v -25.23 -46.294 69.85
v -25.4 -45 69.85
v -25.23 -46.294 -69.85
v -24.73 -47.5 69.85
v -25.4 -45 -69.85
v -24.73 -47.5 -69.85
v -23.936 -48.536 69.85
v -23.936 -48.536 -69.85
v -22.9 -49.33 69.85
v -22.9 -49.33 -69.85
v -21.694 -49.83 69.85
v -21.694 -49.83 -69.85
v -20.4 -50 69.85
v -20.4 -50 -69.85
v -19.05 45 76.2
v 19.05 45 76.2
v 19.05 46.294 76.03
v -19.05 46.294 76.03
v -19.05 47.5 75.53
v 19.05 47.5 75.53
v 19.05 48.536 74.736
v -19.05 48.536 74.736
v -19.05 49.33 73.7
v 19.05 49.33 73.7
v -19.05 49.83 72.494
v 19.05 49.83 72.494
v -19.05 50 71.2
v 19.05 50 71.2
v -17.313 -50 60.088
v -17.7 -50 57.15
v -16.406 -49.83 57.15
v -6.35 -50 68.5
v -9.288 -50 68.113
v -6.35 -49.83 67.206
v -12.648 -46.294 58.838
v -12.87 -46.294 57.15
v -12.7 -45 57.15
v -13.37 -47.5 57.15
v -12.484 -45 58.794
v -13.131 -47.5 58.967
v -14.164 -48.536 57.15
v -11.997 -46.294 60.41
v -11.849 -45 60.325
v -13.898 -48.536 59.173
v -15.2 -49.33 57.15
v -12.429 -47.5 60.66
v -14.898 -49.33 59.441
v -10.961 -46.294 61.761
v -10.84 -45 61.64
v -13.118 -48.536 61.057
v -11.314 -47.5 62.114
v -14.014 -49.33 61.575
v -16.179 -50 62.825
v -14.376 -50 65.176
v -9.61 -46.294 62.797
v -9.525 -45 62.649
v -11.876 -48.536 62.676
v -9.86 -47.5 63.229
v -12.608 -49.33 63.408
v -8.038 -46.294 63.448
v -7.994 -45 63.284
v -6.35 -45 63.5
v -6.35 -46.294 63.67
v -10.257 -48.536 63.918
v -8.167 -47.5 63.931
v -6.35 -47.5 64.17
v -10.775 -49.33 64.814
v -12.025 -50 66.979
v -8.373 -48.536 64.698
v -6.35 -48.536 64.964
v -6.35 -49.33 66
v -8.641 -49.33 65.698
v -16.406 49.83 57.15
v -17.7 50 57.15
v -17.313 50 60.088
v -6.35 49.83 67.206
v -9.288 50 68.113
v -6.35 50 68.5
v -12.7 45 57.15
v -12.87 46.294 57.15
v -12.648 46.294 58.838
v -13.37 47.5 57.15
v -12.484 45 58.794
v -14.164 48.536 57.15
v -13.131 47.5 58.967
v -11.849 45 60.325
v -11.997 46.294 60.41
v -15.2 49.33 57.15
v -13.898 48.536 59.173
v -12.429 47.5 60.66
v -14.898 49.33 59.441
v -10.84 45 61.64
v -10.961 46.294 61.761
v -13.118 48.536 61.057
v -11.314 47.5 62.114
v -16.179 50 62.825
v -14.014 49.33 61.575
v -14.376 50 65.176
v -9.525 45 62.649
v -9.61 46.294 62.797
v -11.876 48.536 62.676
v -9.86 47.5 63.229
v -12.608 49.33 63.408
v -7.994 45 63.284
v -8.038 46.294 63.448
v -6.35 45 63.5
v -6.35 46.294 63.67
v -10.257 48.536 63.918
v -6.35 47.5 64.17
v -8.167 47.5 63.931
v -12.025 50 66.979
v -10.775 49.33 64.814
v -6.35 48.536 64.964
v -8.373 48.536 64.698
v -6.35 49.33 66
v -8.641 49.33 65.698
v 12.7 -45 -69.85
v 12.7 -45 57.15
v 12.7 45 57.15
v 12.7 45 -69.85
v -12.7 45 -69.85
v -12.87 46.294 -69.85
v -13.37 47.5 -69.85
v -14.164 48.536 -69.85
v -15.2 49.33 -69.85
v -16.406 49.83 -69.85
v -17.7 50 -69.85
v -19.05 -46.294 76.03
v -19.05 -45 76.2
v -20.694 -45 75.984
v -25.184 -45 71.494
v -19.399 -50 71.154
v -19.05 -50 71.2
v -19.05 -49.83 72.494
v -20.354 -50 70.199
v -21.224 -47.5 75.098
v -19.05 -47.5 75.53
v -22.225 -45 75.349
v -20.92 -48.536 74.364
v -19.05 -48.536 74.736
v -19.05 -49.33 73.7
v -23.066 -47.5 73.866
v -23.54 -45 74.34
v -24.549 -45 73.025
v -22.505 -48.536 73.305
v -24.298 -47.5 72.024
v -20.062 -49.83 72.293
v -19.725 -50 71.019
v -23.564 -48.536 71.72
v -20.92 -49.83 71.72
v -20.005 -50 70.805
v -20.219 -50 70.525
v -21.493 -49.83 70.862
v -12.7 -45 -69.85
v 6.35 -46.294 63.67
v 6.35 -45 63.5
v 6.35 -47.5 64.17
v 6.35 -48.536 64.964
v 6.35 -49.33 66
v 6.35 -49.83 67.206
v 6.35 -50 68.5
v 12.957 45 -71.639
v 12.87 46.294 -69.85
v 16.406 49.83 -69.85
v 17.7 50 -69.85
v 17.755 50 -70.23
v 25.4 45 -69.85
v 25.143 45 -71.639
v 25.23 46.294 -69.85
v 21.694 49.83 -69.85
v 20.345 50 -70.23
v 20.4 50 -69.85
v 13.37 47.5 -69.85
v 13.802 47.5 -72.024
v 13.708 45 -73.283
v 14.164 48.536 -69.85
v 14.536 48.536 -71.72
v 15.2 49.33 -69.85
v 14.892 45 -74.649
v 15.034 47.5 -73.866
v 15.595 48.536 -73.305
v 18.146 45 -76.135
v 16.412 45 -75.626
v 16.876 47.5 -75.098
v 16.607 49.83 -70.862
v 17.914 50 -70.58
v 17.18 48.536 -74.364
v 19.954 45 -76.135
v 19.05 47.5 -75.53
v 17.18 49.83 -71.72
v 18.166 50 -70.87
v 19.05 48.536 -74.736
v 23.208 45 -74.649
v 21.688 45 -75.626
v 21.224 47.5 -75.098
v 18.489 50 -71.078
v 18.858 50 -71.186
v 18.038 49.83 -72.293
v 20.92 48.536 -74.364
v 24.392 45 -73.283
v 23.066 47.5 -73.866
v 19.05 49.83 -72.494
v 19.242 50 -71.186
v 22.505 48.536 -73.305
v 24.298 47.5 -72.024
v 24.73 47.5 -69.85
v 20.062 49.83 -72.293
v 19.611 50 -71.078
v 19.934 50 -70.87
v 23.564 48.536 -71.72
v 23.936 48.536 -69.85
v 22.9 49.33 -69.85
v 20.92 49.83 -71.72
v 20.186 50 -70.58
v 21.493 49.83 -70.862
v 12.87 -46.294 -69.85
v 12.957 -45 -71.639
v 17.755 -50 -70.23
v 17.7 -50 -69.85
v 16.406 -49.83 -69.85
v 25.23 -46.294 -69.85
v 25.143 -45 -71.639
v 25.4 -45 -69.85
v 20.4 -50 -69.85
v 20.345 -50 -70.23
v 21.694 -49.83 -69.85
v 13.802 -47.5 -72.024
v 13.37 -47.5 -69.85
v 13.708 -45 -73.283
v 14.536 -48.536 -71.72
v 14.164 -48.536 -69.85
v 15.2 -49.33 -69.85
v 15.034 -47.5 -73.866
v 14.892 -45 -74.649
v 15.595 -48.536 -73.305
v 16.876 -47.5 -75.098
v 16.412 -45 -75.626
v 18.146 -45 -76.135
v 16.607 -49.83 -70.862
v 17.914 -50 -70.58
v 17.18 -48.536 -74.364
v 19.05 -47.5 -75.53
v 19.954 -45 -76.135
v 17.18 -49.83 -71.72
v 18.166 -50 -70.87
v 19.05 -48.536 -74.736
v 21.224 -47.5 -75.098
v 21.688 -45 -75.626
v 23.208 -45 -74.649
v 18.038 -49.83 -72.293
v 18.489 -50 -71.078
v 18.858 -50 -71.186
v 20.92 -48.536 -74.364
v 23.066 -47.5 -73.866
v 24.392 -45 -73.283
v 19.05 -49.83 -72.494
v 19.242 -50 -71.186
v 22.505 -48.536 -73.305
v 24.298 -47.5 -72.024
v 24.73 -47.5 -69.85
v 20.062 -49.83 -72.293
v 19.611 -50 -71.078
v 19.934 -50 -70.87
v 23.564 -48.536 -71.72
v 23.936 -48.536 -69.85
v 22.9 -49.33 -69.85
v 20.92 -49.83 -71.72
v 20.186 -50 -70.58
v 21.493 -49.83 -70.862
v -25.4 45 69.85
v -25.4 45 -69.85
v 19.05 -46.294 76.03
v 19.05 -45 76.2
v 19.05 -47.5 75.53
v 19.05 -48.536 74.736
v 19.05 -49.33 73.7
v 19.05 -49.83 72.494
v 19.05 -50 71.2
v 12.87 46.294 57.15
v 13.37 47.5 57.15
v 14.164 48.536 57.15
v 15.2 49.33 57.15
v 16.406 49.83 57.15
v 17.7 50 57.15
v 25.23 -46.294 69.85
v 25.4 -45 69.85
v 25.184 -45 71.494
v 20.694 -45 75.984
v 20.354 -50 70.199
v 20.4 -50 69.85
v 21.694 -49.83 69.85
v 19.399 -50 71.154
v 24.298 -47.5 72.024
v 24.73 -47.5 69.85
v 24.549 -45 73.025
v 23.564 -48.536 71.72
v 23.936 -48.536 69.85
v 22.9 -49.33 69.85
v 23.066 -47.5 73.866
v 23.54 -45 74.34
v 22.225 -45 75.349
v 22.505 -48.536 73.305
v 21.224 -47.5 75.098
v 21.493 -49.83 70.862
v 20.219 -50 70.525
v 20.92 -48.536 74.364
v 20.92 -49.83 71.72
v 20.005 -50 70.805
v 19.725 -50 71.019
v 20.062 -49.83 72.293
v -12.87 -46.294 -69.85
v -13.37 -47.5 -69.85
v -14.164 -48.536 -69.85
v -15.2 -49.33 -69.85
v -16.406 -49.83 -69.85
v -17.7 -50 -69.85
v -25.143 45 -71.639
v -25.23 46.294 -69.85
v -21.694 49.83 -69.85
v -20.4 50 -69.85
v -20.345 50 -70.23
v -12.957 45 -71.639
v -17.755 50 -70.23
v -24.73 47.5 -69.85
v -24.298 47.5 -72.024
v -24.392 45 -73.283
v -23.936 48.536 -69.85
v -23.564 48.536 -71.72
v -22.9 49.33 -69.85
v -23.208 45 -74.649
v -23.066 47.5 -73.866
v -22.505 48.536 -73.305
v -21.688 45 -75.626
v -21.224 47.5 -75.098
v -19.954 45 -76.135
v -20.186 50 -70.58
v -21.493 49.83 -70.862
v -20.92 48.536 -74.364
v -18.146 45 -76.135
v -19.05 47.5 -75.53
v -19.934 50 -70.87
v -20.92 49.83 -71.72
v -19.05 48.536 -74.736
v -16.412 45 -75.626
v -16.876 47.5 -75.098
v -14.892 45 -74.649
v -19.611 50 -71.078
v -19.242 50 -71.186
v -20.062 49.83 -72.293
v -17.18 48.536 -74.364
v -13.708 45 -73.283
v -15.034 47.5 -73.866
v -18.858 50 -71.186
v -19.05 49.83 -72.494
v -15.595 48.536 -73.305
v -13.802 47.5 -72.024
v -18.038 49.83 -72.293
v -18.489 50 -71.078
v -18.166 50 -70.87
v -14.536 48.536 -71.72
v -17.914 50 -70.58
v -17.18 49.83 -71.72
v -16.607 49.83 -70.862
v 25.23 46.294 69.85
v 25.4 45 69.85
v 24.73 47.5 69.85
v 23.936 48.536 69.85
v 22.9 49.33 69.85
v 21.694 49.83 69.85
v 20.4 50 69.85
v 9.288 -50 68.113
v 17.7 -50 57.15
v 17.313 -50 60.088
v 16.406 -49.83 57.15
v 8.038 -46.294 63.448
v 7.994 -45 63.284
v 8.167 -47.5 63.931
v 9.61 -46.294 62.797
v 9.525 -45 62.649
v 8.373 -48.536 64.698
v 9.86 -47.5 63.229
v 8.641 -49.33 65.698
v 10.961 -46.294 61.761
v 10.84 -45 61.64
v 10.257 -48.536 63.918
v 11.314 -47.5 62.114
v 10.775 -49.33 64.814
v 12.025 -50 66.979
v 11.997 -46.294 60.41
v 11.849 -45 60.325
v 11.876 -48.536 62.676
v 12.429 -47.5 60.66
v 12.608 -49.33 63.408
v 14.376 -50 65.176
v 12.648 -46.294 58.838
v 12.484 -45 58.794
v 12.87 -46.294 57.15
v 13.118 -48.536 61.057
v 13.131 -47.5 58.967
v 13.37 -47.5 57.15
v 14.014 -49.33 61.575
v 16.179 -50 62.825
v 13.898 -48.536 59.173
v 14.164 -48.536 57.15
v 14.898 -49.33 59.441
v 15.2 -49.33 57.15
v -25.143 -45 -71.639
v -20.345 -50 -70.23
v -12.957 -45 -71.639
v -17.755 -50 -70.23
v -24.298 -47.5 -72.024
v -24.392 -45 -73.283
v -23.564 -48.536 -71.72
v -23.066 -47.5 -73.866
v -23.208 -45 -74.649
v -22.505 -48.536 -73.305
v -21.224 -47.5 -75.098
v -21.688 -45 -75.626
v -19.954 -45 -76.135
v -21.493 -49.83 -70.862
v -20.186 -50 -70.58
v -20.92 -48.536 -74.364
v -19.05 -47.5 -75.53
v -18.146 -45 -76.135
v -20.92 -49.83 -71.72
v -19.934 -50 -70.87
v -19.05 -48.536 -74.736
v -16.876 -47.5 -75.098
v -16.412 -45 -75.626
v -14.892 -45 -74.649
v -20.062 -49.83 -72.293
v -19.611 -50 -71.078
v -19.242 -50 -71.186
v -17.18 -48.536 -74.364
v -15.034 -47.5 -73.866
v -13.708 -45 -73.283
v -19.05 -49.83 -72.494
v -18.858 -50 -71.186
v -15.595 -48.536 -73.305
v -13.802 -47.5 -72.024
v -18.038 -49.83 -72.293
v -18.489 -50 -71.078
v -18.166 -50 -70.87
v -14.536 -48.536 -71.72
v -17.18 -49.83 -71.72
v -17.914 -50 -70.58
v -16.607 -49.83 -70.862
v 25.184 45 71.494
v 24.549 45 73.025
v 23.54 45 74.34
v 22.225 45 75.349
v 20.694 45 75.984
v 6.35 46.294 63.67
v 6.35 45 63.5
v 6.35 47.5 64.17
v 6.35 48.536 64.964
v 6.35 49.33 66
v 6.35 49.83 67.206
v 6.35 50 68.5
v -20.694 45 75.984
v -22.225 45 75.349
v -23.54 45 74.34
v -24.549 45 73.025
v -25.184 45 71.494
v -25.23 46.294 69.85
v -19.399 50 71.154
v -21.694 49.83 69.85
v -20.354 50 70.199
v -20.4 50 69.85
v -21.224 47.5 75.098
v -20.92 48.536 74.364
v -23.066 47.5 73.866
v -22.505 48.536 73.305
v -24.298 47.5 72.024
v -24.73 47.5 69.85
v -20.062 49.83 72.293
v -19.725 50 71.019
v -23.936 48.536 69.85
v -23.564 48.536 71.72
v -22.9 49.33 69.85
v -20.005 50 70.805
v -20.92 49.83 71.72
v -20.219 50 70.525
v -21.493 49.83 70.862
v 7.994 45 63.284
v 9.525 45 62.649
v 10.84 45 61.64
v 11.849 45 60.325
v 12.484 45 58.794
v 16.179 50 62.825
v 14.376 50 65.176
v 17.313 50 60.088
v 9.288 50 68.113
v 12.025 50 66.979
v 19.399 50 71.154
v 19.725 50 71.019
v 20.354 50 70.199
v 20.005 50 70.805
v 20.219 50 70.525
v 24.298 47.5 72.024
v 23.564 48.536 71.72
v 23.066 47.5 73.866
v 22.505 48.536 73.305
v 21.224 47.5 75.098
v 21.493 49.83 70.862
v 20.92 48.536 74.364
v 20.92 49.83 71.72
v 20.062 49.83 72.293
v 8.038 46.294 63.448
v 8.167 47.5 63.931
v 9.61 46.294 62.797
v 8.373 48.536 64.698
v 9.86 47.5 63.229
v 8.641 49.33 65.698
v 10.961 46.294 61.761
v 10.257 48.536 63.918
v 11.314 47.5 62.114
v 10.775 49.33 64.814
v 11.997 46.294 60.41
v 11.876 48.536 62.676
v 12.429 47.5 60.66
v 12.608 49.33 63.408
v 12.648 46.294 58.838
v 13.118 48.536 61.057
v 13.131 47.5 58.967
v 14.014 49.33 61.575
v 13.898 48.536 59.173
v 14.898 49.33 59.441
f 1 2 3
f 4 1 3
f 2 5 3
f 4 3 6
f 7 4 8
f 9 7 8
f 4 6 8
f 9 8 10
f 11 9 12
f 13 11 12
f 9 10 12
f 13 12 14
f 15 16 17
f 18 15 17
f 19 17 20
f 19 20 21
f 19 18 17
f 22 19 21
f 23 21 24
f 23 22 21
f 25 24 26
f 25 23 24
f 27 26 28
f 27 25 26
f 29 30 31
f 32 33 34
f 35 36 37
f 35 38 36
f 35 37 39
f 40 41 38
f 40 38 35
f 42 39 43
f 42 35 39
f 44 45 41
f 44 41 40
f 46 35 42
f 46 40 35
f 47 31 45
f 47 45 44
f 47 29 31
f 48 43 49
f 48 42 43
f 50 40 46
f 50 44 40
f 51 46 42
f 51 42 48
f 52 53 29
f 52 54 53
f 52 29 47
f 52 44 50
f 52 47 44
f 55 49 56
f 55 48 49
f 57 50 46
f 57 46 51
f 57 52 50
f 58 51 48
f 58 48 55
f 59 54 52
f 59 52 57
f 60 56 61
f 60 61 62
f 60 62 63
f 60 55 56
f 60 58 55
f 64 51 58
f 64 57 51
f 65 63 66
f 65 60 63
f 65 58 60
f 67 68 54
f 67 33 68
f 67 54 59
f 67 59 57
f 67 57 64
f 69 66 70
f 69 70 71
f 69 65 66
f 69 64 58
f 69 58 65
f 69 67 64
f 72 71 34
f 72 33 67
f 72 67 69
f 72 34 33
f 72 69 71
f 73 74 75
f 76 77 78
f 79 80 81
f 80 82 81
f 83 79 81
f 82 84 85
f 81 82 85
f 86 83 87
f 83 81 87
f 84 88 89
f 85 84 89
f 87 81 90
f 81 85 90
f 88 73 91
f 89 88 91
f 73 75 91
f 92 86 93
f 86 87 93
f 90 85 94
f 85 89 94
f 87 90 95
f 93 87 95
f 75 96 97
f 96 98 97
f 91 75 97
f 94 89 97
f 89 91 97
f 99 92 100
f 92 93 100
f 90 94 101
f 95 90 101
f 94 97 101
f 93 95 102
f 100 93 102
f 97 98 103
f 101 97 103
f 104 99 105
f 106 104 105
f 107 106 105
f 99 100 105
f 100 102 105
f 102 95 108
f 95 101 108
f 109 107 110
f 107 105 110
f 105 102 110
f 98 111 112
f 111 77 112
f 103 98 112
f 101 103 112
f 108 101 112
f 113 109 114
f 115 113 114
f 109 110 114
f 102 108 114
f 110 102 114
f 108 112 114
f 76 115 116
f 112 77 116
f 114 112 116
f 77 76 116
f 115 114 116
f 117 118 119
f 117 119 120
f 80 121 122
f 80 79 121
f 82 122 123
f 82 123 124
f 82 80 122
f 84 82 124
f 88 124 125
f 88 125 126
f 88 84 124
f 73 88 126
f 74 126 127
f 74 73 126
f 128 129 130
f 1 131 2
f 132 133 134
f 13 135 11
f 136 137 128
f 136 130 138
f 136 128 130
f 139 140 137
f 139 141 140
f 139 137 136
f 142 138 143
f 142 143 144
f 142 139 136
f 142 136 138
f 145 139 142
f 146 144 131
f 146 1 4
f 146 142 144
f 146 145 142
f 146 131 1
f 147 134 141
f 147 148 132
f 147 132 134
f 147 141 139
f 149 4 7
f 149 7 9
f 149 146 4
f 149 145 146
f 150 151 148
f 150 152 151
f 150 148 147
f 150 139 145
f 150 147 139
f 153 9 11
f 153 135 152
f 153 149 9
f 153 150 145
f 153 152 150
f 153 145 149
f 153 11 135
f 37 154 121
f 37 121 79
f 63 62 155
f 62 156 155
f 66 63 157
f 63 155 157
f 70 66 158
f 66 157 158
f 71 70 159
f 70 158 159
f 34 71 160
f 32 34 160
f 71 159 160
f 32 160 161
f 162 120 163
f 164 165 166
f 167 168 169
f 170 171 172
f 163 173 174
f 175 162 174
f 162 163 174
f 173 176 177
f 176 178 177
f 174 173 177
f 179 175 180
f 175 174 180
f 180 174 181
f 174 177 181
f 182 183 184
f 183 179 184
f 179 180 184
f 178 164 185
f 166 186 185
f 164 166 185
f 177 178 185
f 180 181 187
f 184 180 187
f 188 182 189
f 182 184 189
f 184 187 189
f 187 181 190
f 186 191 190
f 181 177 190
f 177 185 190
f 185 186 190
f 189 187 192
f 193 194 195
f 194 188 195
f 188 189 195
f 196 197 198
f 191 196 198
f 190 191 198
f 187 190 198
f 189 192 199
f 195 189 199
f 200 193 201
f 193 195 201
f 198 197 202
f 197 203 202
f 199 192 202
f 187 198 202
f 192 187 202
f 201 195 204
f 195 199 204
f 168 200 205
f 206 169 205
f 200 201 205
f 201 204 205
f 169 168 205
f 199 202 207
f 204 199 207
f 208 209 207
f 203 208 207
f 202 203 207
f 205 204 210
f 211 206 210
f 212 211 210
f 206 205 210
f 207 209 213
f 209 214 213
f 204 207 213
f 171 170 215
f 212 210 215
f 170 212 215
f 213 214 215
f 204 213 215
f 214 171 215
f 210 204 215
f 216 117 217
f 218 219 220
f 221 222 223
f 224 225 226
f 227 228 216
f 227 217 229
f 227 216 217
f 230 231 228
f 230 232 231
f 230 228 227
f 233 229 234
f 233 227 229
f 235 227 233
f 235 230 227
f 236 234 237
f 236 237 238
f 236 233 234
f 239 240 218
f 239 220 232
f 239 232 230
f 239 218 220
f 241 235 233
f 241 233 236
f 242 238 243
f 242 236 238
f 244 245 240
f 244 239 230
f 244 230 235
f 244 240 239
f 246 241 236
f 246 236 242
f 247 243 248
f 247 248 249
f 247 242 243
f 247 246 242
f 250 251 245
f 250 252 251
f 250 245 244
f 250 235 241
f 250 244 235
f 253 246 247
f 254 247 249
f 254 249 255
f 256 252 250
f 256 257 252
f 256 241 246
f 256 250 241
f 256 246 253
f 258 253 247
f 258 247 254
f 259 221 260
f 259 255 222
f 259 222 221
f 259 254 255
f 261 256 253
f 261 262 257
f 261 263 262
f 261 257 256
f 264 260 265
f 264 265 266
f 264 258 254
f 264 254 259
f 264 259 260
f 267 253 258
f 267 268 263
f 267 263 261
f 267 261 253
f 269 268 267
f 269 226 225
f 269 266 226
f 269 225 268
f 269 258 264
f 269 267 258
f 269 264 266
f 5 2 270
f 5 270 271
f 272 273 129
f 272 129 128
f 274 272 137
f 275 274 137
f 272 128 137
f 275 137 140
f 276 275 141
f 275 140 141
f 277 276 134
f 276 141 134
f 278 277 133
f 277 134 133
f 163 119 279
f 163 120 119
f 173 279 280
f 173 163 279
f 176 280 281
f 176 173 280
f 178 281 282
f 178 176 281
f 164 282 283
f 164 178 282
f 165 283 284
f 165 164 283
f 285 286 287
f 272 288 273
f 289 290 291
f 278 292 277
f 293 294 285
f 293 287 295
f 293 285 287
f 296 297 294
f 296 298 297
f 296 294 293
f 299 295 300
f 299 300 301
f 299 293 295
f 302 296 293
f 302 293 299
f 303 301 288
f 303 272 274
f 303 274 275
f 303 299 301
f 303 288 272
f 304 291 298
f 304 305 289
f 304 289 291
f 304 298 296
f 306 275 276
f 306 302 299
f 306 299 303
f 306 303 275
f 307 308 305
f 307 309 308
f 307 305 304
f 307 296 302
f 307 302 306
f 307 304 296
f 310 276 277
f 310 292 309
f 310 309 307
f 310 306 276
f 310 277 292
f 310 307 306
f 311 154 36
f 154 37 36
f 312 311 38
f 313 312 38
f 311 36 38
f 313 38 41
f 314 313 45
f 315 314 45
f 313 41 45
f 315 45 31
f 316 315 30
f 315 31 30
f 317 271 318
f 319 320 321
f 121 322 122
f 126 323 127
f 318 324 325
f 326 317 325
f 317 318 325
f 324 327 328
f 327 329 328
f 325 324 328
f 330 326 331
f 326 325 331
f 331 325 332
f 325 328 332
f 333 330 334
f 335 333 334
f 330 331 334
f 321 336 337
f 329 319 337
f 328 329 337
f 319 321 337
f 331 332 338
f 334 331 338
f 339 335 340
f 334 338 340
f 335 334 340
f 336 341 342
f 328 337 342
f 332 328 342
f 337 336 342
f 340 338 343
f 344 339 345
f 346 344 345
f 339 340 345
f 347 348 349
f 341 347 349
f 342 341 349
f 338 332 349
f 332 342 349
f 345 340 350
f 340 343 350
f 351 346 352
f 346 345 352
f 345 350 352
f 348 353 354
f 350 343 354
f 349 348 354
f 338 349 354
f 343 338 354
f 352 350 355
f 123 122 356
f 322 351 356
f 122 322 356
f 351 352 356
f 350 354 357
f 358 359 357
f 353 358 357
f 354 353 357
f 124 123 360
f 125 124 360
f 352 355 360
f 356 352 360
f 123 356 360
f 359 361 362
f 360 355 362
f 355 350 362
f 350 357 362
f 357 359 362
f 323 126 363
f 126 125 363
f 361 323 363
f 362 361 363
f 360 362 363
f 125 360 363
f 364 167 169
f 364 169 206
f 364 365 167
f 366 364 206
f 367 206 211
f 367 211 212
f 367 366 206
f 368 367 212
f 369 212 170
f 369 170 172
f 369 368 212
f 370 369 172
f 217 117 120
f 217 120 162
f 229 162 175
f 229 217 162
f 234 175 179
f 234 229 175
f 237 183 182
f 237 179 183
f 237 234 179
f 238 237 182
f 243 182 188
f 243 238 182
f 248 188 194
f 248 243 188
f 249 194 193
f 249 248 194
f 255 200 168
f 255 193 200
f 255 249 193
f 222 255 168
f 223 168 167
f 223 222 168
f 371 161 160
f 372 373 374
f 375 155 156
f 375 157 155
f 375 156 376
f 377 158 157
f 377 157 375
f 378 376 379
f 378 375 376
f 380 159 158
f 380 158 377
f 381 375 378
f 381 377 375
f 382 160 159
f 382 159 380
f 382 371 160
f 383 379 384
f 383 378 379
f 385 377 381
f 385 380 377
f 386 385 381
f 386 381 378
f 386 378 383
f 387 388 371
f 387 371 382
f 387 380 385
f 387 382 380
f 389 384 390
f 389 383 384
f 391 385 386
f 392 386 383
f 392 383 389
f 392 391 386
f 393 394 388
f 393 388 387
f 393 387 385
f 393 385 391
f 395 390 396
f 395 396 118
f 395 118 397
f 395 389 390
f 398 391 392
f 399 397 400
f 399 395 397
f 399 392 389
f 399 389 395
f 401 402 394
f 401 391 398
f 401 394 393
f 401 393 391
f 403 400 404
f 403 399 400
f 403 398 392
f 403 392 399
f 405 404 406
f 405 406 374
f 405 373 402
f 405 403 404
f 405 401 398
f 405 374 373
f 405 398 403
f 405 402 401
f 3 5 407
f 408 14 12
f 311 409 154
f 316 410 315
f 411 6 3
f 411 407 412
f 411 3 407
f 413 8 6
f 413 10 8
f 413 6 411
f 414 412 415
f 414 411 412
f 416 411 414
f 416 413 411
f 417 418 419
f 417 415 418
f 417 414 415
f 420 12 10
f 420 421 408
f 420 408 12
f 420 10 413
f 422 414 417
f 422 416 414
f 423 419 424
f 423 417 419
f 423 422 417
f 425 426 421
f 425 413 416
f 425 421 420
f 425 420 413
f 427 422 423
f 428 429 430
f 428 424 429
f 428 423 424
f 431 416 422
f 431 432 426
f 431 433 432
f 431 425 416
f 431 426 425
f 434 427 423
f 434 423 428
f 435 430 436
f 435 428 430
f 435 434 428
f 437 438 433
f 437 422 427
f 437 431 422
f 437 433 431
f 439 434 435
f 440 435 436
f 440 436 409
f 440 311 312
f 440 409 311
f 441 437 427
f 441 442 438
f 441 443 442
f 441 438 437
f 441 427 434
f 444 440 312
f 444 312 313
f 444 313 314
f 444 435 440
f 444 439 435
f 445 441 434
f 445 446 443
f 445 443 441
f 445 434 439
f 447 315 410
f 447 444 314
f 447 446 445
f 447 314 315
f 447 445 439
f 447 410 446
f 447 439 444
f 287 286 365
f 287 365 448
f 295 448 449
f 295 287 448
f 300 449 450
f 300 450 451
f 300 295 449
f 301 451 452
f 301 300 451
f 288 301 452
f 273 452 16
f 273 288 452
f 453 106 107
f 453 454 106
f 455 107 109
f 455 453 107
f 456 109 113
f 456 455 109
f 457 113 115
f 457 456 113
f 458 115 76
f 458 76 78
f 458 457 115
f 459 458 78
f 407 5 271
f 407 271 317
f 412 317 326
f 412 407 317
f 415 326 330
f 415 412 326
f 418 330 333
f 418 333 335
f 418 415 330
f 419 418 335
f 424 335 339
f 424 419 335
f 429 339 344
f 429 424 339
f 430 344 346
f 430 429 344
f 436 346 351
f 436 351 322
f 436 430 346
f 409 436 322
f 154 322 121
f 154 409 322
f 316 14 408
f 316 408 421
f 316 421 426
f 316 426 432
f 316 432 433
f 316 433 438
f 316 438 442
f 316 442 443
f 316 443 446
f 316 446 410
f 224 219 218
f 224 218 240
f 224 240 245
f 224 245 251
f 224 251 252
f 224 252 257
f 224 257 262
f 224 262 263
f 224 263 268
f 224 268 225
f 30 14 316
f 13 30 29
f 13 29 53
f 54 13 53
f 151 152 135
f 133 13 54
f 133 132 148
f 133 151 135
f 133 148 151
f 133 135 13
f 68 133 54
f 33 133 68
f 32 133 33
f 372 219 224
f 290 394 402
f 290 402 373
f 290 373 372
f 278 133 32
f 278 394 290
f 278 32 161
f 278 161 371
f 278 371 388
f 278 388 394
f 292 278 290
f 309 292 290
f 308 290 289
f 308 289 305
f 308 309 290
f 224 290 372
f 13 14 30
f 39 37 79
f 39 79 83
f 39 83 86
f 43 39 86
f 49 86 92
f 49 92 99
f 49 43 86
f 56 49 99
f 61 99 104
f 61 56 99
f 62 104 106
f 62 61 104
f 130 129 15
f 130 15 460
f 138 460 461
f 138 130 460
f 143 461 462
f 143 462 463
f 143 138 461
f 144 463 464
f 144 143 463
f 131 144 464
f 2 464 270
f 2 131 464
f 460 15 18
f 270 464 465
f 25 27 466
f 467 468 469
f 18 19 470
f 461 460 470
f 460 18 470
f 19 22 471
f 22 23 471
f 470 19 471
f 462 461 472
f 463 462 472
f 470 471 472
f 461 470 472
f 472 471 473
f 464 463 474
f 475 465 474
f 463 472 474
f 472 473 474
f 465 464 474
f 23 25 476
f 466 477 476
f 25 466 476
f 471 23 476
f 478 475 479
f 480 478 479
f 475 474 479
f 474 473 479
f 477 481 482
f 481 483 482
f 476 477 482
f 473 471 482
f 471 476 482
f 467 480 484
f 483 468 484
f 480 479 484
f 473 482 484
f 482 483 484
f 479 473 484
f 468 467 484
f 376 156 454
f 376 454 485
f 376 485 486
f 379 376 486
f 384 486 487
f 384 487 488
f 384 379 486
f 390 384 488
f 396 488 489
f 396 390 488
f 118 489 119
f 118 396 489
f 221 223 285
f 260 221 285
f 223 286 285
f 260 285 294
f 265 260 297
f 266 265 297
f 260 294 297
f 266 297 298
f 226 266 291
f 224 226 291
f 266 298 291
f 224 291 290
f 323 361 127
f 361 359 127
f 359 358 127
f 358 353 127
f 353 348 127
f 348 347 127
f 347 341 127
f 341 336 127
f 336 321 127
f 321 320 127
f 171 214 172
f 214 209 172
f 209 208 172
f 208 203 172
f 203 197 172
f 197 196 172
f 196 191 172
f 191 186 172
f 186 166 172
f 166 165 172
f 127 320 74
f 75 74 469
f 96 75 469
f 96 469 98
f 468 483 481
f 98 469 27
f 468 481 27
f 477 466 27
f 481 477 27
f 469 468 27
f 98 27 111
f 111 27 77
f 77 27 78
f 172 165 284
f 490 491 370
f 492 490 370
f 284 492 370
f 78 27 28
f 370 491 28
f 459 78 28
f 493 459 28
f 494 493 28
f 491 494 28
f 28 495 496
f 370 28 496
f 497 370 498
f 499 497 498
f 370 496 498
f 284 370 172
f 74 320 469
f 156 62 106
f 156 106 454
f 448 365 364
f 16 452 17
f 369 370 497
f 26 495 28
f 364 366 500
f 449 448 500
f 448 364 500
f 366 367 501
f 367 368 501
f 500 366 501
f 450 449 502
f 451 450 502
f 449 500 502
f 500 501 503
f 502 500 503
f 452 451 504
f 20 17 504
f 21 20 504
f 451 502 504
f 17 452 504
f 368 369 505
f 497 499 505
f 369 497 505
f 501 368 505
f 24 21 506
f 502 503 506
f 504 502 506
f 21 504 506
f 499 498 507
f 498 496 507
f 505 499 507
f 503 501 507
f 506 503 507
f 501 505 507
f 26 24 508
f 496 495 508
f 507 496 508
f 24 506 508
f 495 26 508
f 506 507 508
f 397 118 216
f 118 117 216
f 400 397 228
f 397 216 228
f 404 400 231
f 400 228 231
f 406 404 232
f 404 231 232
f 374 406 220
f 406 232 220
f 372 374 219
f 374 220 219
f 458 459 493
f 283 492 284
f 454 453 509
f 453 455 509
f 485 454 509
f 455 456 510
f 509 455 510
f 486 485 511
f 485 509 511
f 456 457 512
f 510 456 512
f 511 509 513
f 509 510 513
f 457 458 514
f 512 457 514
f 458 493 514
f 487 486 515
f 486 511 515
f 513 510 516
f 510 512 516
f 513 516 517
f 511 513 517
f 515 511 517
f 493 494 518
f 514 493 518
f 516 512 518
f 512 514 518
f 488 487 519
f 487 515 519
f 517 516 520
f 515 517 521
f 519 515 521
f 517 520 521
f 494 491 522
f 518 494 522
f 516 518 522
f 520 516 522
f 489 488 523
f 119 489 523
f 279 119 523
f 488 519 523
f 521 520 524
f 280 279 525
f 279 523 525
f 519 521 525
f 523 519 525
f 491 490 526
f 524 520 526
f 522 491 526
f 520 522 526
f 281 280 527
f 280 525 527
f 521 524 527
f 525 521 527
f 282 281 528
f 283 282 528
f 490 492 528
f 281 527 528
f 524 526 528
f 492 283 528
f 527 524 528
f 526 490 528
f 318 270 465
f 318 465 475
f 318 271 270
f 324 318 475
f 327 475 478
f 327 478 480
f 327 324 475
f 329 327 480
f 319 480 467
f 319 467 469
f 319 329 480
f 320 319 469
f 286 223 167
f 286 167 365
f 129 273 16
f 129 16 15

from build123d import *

# Parameters (mm, degrees)
F1_DEPTH = 50
F2_R     = 5


with BuildPart() as f1:
    # F0 (on Front) → F1 (new body, symmetric)
    with BuildSketch(Plane.XZ):
        with BuildLine():
            Line((19.05, 76.2), (-19.05, 76.2))
            ThreePointArc((-19.05, 76.2), (-23.5401280605, 74.3401280605), (-25.4, 69.85))
            Line((-25.4, 69.85), (-25.4, -69.85))
            ThreePointArc((-25.4, -69.85), (-23.5401280605, -74.3401280605), (-19.05, -76.2))
            ThreePointArc((-19.05, -76.2), (-14.5598719395, -74.3401280605), (-12.7, -69.85))
            Line((-12.7, -69.85), (-12.7, -63.5))
            Line((-12.7, -63.5), (-12.7, 57.15))
            ThreePointArc((-12.7, 57.15), (-10.8401280605, 61.6401280605), (-6.35, 63.5))
            Line((-6.35, 63.5), (6.35, 63.5))
            ThreePointArc((6.35, 63.5), (10.8401280605, 61.6401280605), (12.7, 57.15))
            Line((12.7, 57.15), (12.7, -63.5))
            Line((12.7, -63.5), (12.7, -69.85))
            ThreePointArc((12.7, -69.85), (14.5598719395, -74.3401280605), (19.05, -76.2))
            ThreePointArc((19.05, -76.2), (23.5401280605, -74.3401280605), (25.4, -69.85))
            Line((25.4, -69.85), (25.4, 69.85))
            ThreePointArc((25.4, 69.85), (23.5401280605, 74.3401280605), (19.05, 76.2))
        make_face()
    extrude(amount=F1_DEPTH, both=True)

    # F2
    f2_edges = [f1.edges().sort_by_distance(p)[0] for p in [
        (19.05, 50, -76.2),
        (25.4, 50, 0),
        (23.540128, 50, 74.340128),
        (0, 50, 76.2),
        (-23.540128, 50, 74.340128),
        (-25.4, 50, 0),
        (-19.05, 50, -76.2),
        (-12.7, 50, -6.35),
        (-10.840128, 50, 61.640128),
        (0, 50, 63.5),
        (10.840128, 50, 61.640128),
        (12.7, 50, -6.35),
        (19.05, -50, -76.2),
    ]]
    fillet(f2_edges, radius=F2_R)


solid = f1.part
